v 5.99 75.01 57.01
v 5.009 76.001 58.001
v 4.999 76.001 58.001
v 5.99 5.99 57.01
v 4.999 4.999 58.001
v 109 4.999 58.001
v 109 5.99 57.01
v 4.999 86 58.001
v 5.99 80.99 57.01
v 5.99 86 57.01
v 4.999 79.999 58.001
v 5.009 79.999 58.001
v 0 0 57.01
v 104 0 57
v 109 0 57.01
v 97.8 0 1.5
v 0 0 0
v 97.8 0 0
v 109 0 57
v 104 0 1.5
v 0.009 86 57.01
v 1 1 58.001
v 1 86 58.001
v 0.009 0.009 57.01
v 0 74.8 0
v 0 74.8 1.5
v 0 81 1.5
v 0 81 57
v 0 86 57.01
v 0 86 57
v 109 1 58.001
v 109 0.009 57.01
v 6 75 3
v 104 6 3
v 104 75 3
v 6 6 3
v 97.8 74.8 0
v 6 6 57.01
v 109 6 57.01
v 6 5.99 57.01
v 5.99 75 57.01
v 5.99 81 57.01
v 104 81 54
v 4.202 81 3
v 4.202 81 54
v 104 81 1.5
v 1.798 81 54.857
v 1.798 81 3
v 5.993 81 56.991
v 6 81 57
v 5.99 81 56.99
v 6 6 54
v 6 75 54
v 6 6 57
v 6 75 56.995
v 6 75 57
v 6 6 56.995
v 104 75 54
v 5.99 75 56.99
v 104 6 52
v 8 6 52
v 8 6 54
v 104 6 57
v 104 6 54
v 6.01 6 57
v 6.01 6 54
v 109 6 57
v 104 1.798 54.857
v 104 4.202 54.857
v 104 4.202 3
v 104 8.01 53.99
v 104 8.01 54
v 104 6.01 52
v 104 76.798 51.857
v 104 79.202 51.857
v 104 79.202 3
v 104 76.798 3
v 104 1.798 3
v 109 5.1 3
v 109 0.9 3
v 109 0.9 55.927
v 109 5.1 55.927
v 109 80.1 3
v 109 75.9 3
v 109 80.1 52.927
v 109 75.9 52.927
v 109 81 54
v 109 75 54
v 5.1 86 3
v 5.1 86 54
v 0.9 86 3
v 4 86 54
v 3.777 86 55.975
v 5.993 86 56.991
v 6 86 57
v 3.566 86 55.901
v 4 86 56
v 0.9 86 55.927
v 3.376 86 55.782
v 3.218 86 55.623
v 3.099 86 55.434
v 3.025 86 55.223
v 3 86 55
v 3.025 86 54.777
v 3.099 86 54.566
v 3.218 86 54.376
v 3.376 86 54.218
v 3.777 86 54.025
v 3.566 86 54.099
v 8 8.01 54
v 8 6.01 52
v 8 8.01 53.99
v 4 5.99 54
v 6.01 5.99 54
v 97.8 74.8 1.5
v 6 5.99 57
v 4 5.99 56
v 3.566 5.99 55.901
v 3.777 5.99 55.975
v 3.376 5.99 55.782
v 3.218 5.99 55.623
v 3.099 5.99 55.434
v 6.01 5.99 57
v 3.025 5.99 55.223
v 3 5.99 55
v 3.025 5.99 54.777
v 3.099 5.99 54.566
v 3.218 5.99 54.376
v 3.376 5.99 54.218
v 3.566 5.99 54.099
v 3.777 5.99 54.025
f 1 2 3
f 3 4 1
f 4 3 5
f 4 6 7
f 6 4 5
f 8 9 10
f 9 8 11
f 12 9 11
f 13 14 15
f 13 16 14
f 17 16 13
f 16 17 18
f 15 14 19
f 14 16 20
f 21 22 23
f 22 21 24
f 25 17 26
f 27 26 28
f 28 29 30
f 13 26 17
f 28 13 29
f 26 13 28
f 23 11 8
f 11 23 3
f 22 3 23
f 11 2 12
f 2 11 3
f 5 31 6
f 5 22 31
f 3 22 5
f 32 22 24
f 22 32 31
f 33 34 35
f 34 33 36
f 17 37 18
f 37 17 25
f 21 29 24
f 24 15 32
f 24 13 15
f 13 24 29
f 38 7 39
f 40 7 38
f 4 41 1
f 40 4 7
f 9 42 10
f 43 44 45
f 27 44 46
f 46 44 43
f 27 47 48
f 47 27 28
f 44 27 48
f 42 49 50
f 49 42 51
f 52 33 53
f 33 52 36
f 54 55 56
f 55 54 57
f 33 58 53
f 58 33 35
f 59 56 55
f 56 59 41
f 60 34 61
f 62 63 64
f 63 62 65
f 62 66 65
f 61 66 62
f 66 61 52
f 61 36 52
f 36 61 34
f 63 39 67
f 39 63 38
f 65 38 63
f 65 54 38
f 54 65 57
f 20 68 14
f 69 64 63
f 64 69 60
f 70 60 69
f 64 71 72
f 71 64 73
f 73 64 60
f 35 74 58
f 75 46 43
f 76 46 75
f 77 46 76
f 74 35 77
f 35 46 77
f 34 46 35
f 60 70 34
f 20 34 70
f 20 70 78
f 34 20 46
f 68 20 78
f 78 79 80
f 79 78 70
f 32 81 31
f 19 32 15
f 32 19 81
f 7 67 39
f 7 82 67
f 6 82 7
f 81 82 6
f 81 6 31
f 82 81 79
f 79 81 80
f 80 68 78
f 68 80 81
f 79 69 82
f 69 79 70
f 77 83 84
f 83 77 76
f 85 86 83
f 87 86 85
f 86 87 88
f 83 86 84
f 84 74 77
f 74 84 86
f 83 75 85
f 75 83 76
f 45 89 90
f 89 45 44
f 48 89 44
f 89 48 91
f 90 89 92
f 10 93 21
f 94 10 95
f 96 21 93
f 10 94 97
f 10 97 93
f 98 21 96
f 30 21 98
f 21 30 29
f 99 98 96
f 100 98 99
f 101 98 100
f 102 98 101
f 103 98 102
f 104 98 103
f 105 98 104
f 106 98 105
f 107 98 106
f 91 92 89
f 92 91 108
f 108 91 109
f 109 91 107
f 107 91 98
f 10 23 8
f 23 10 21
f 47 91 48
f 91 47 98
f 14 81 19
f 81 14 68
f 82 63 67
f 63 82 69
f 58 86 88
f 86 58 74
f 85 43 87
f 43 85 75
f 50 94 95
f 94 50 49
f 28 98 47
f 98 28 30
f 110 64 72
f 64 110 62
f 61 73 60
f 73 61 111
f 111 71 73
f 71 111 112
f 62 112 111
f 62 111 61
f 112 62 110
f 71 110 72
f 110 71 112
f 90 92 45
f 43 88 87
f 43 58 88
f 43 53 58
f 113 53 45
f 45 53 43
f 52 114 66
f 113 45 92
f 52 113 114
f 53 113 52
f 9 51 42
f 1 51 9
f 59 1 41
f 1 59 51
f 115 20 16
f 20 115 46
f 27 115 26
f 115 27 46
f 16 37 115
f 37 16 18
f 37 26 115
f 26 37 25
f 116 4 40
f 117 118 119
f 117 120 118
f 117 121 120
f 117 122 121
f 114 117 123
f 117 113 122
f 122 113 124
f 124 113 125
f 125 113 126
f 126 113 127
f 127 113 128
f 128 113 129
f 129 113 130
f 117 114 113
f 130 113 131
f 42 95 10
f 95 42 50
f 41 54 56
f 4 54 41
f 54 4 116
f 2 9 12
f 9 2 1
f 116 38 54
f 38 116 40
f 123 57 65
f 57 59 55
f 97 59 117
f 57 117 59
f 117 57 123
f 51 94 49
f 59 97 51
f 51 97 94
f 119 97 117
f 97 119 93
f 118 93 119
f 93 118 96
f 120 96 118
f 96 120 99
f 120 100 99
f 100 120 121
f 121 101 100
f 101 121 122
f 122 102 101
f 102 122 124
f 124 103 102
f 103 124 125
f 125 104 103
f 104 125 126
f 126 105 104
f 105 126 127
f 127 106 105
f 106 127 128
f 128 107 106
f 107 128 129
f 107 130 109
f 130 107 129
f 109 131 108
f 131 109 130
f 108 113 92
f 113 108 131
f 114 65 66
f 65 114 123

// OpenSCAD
// ============================================================================
// ★★★ STABLE BASELINE — v23_stable (2026-06-23) ★★★
// First fully stable lid design: recessed clear-sheet lid, capped journal hinge,
// two light detent clips flanking an elliptical finger notch, support rail cut
// away across the notch span. Geometry verified balanced; print-ready.
// DO NOT overwrite — branch from this for the post-first-print iteration.
// ============================================================================
// cutlery_box.scad
// Graduated 3-chamber disposable-cutlery box (Option 3) — CUT-FROM-SOLID port
// of build_box.py, for a 120 x 120 x 120 mm printer (AOSEED).
//
// WHY THIS PORT EXISTS (the whole point):
//   The hand-mesh generator (build_box.py) could not keep the 1 mm rim chamfer
//   continuous across the female dovetail joints, because where a slot's flared
//   corner crosses the sloped chamfer it needs a true boolean intersection.
//   OpenSCAD HAS that boolean kernel, so here we do exactly the "cut-from-solid"
//   thing:
//      1. Build the ENTIRE box as ONE solid, WITH the chamfer already on it.
//      2. difference() out vertical dovetail prisms ( /_\ cross-section ),
//         running from just above the base plate up THROUGH the rim, to both
//         (a) form the sliding-dovetail joints, and
//         (b) split the box into 6 bed-sized pieces.
//   Because the cut is a real boolean through the already-chamfered solid, the
//   sloped chamfer<->slot edge is produced for free => the rim chamfer stays
//   CONTINUOUS across every joint, with none of the sliver hacks.
//
// ----------------------------------------------------------------------------
// HOW TO USE
//   In the app:  set `part` below (or use the Customizer dropdown), F5 to
//                preview, F6 to render, then File > Export > STL.
//   One piece (CLI):
//      openscad -o body_knife_A.stl -D 'part="knife_A"' cutlery_box.scad
//   ALL SIX (bash, run from this folder):
//      for p in knife_A knife_B fork_A fork_B spoon_A spoon_B; do \
//        openscad -o "body_$p.stl" -D "part=\"$p\"" cutlery_box.scad ; done
//   PNG preview of one piece:
//      openscad -o knife_B.png --imgsize=1400,1000 --autocenter --viewall \
//        -D 'part="knife_B"' cutlery_box.scad
//
//   Pieces are modelled in ASSEMBLED coordinates (floor-down, z=0 is the bed),
//   so importing all six STLs together shows the assembled box directly; your
//   slicer will auto-drop each one onto the plate for printing.
//
// BED SANITY: every piece is <= 120 mm in X, Y, Z.
//   Z = 58 mm. Widest piece = spoon at 117 mm (Y). A-halves reach 109 mm (X,
//   including the protruding dovetail key). All under 120.
//
// !! I could NOT run OpenSCAD to verify this file (no binary in my sandbox) !!
//   - The rim chamfer is a SMOOTH, true-45 bevel built from hull() frustums of
//     convex rectangles. Works in every OpenSCAD since ~2015 (incl. Homebrew
//     2021.01). No stepped staircase -- and, crucially, it makes box() a clean
//     well-formed solid so the per-part booleans resolve reliably (the old
//     14-slice staircase was fragile and CGAL was dropping the walls of the
//     interior parts, leaving only the key prisms => "floating boxes").
//   - roof() is still available behind USE_ROOF=true for those who have it
//     (2021.01+ snapshots); for THIS rectangular design it is identical, so it
//     is NOT required.
//   - After F6, check the console for "WARNING"/"not a valid 2-manifold".
//     If a tenon ever looks detached, bump EPS to 0.05.
// ============================================================================


/* [Part to render / export] */
part = "knife_A"; // [knife_A, knife_B, fork_A, fork_B, spoon_A, spoon_B, assembly]

/* [Chamfer method] */
// false = smooth hull() frustum bevel (default, any OpenSCAD); true = roof() (2021.01+)
USE_ROOF = false;

/* [Heights (mm)] */
BASE   = 3.0;     // floor / base-plate thickness
COMP_H = 55.0;    // interior wall height above the floor (cutlery stack depth)

/* [Walls (mm)] */
HOST_T   = 6.0;     // thickness of every wall (thick enough to host a dovetail)
HALF_LEN = 104.0;   // printed length of each half (A = near, B = far); <120 incl. key

/* [Chamber bays (mm)] */
N_COL     = 3;       // columns of cutlery per chamber
KNIFE_COL = 23.0;    // -> knife bay 69  (3 x 19 mm knives + play)
FORK_COL  = 33.0;    // -> fork  bay 99  (3 x 29 mm forks  + play)
SPOON_COL = 37.0;    // -> spoon bay 111 (3 x 34 mm spoons + play, trimmed <120)

/* [Dovetail joint (mm)] */
DT_DEPTH = 5.0;   // tail protrusion past the seam (male key depth)
DT_NECK  = 1.2;   // half-width at the seam face (narrow)
DT_FLARE = 2.1;   // half-width at the tip (wide -> locks)
DT_CLR   = 0.4;   // FLANK/seam slide clearance added to the female socket (do not change for fit)
DT_DEPTH_RELIEF = 0.3; // extra depth on the socket BACK only, so the tail tip never bottoms out

/* [Hidden-dovetail top cap / "hat" (mm)] */
// The dovetail otherwise shows its trapezoid outline on the TOP edge of the wall.
// To hide it, the MALE piece extends the wall's full-width top (chamfer included)
// across the key footprint -> a flush, continuous top. The FEMALE piece gets a
// matching top RECESS (cap footprint + CAP_CLR) so the cap drops straight in.
// Result: the top reads as one surface with a single straight seam line at the cap
// tip; the dovetail joinery lives entirely below the cap.
//
// SELF-SUPPORTING UNDERSIDE: the cap reaches the FULL wall width at the chamfer base
// (so the top edge reads as the wall extended, with NO recessed sliver on the outer
// face), and its underside is ONE planar ramp from the chamfer's OUTER CORNER
// (half-width HOST_T/2 at z = BODY_H-CHAMFER) down to the dovetail-neck half-width
// (CAP_FOOT) at CAP_SLANT_DEG from horizontal. No little horizontal step. The ramp
// reaching full width exactly at the chamfer base means "ramp top" == "chamfer base"
// (CAP_H is DERIVED). The FEMALE recess is the same ramp + CAP_CLR play.
// TRADEOFF: because the cap runs all the way to the outer corner, the female wall
// tapers to ~0 at z = BODY_H-CHAMFER -> a thin feather edge at the joint (gradual at
// CAP_SLANT_DEG, hidden inside the joint when assembled). Accepted per design intent.
CAP_SLANT_DEG = 50;     // cap underside ramp angle from horizontal (50 = self-supporting, long flare)
CAP_FOOT = DT_NECK;     // cap-underside half-width where it meets the dovetail neck
CAP_CLR = 0.3;          // slide clearance so the male cap seats into the female top recess

/* [Rim chamfer (mm)] */
CHAMFER = 1.0;    // 45-deg comfort break broken along the top wall edges

/* [Base half-lap / anti-warp (mm)] */
// Neighbouring base plates overlap as a HORIZONTAL half-lap (shiplap) at mid-base
// height, so corners stay coplanar (no lift/protrusion). Horizontal lap faces do
// NOT bind the vertical-drop assembly. Shingle direction: A->B and knife->fork->spoon.
LAP_LEN = 6;        // overlap past the A/B seam and the knife/fork seam
LAP_LEN_FS = 2;     // overlap past the fork/SPOON seam -- SMALLER: spoon is the
                    // tightest piece (117mm of the 120mm bed); a 6mm lap there
                    // would push spoon to 123mm. 2mm keeps spoon at 119mm.
LAP_Z   = BASE/2;   // 1.5 -- horizontal split height of the lap (bottom vs top half)
LAP_CLR = 0.2;      // in-plane clearance so the shelf isn't a press fit

/* [Lid — box features that receive a flat ORDERED clear sheet] */
// The lid itself is NOT printed: it's a flat ~2 mm PETG/Tritan sheet, bullnose-polished
// edges (r=LID_EDGE_R), ordered to size. We only model the box features that receive it.
LID_T            = 2.0;   // ordered sheet thickness
LID_EDGE_R       = 1.0;   // ordered sheet bullnose edge radius (for the sheet order spec)
LID_PLAY         = 0.4;   // total vertical play in the hinge groove (sheet + this)
LID_RECESS       = 2.0;   // lid TOP sits this far BELOW the rim, so the journal pocket is fully
                          // capped (rim caps the bullnose -> retains the lid when raised; tilt-in)
HINGE_AT_MINUS_X = true;  // hinge on the -x (303mm) end wall; clip on +x. (flip = mirror; default delivered)
// perimeter support ledge (lid underside rests on it at z = BODY_H-LID_T)
LEDGE_W          = 2.0;   // ledge inward protrusion (its underside ramps back at 45 deg -> self-supporting)
GROOVE_END_INSET = 0.0;   // groove reaches the corners but RUNS OUT smoothly there (no end-face / no
                          // exposed bore); GROOVE_TAPER sets the run-out length
GROOVE_TAPER     = 4.0;   // y-length over which the eased mouth tapers out at each groove end
// hinge journal (cut into the inner face of the hinge end wall, CONTINUOUS along the long edge)
GROOVE_DEPTH     = 3.0;   // 2mm lead-in slot + 1mm pocket radius -> journal sits 2mm back from the
                          // face so its cap clears the swing relief and RETAINS the lid
GROOVE_POCKET_R  = 1.0;   // journal half-cylinder radius (the bullnose sheet edge rolls in it)
// clip latch — TWO light DETENT clips on the clip end wall, flanking a central finger notch.
// "Light detent" = small overhang so the rigid sheet pops past it by hand (not a firm lock).
CLIP_W           = 8.0;   // width of EACH of the two clips
CLIP_LIP         = 0.3;   // retaining overhang (light detent; 0.3 soft .. 0.6 firm-but-stiff)
CLIP_RAMP_H      = 1.6;   // cam-ramp height (press-to-close lead-in)
// finger notch — a through-cut in the clip wall (visible from outside), centered between the
// two clips, so a fingertip can reach the lid edge and lift it (popping both clips at once).
NOTCH_W          = 20.0;  // finger-notch width
NOTCH_DEPTH      = 6.0;   // how far down from the rim to the deepest point (past the lid edge)
NOTCH_ARCH       = 4.0;   // bottom is an ELLIPTICAL arch this tall; the rest is vertical sides
                          // (NOTCH_ARCH < NOTCH_W/2 -> a gentle arch, not a deep half-circle)


/* [Hidden] */
EPS      = 0.01;          // tiny overlap so abutting solids fuse cleanly in CGAL
// Upper-chamber pieces (fork, spoon) were cut by a cell plane laid EXACTLY on the
// divider wall's far face (the lower chamber owns that wall). intersection() along a
// plane coincident with an existing box face makes CGAL leave a ZERO-THICKNESS copy
// of the wall face -> edge-manifold + "watertight" but degenerate (OpenSCAD shows it
// as a blue back-face; Tinkercad thickens it into a phantom block). SEAM_EPS nudges
// those cut planes a hair INTO the open bay so they no longer coincide with any box
// face -> no flap. 0.02 mm is physically nothing but is well clear of CGAL's tolerance.
SEAM_EPS = 0.02;
CUT_OVER = 1.0;           // how far dovetail cutters overshoot the rim (clean cut)

BODY_H    = BASE + COMP_H;     // 58  total height
END_WALL  = HOST_T;            // end walls are dovetail hosts too -> equally thick
TOTAL_LEN = 2 * HALF_LEN;      // 208 assembled length (end wall .. end wall)

// hidden-cap ramp geometry (derived).
//   CAP_HW    = cap MAX half-width = HOST_T/2 (the full wall edge) at the chamfer base.
//   CAP_RISE  = vertical height of the self-supporting CAP_SLANT_DEG underside ramp.
//   CAP_ZRAMP = where the cap reaches full width = the chamfer base (BODY_H-CHAMFER), so
//               the ramp runs straight to the chamfer OUTER CORNER (no horizontal step).
//   CAP_ZBOT  = cap bottom = ramp start; CAP_H derived from it (for reference/report).
//   CAP_ZRAMP_R = recess ramp top, shifted down by CAP_CLR so the recess ramp stays
//               parallel to the cap ramp with uniform play.
CAP_HW      = HOST_T/2;   // cap reaches the FULL wall edge at the chamfer base
CAP_RISE    = (CAP_HW - CAP_FOOT) * tan(CAP_SLANT_DEG);
CAP_ZRAMP   = BODY_H - CHAMFER;               // full width exactly at the chamfer base / outer corner
CAP_ZBOT    = CAP_ZRAMP - CAP_RISE;
CAP_H       = BODY_H - CAP_ZBOT;              // derived; reported
CAP_ZRAMP_R = CAP_ZRAMP;   // recess ramp ALSO tops at the chamfer corner (mirror the cap) -> no vertical lip
// sanity checks
assert(CAP_ZBOT > BASE + 1,
       "cap zone dips too low -- raise CAP_SLANT_DEG");
assert(CAP_HW >= DT_FLARE,
       "cap too narrow to cover the dovetail tail");

// NOTE: lid-derived constants are defined BELOW the Y-layout block, because some of
// them (INTERIOR_Y0/Y1, CLIP_CY) depend on OUTER_L / OUTER_R / EXT_W. See "lid derived".

// bay widths
KNIFE_BAY = N_COL * KNIFE_COL; // 69
FORK_BAY  = N_COL * FORK_COL;  // 99
SPOON_BAY = N_COL * SPOON_COL; // 111

// ---- Y layout (width direction): wall | bay | divider | bay | divider | bay | wall
KNIFE_Y0 = 0;
KNIFE_Y1 = HOST_T + KNIFE_BAY + HOST_T;        // 0..81   (outer wall + bay + divider)
FORK_Y0  = KNIFE_Y1;                           // 81
FORK_Y1  = FORK_Y0 + FORK_BAY + HOST_T;        // 81..186 (bay + divider)
SPOON_Y0 = FORK_Y1;                            // 186
SPOON_Y1 = SPOON_Y0 + SPOON_BAY + HOST_T;      // 186..303(bay + outer wall)
EXT_W    = SPOON_Y1;                           // 303 total width

// lengthwise wall Y-bands [y0,y1] (host the A/B dovetails) + their centers
OUTER_L  = [0, HOST_T];                                       // [0,6]    c=3
DIV_KF   = [HOST_T + KNIFE_BAY, HOST_T + KNIFE_BAY + HOST_T]; // [75,81]  c=78
DIV_FS   = [FORK_Y0 + FORK_BAY, FORK_Y0 + FORK_BAY + HOST_T]; // [180,186]c=183
OUTER_R  = [SPOON_Y1 - HOST_T, SPOON_Y1];                     // [297,303]c=300

// ---- lid derived ---- (placed AFTER OUTER_L/OUTER_R/EXT_W so nothing is forward-referenced)
LID_TOP_Z   = BODY_H - LID_RECESS;        // 56  lid TOP (recessed); rim z=58 rises LID_RECESS above it
LID_Z_UNDER = LID_TOP_Z - LID_T;          // 54  lid underside / ledge top / lowered-divider top
POCKET_CZ   = LID_TOP_Z - LID_T/2;        // 55  journal centre (lid mid) -> pocket top = LID_TOP_Z = capped
// hinge end-wall inner face x + inward direction; clip end-wall inner face x + inward dir
HINGE_INX   = HINGE_AT_MINUS_X ? END_WALL : TOTAL_LEN - END_WALL;       // 6  (default)
HINGE_IN    = HINGE_AT_MINUS_X ? 1 : -1;  // interior direction from the hinge wall (+x default)
CLIP_INX    = HINGE_AT_MINUS_X ? TOTAL_LEN - END_WALL : END_WALL;       // 202 (default)
CLIP_IN     = HINGE_AT_MINUS_X ? -1 : 1;  // interior direction from the clip wall (-x default)
POCKET_CX   = HINGE_INX - HINGE_IN*(GROOVE_DEPTH - GROOVE_POCKET_R);    // 5  pocket centre x (INTO the wall)
INTERIOR_Y0 = OUTER_L[1];                 // 6   inner face of the -y short wall
INTERIOR_Y1 = OUTER_R[0];                 // 297 inner face of the +y short wall
CLIP_CY     = EXT_W/2;                     // 151.5 clip/scallop centre (in the fork chamber)
assert(POCKET_CZ - GROOVE_POCKET_R > BASE + 1,
       "journal dips too low -- reduce LID_RECESS or LID_T");
assert(POCKET_CZ + GROOVE_POCKET_R <= LID_TOP_Z + EPS,
       "journal not capped -- lower the lid (raise LID_RECESS) or shrink GROOVE_POCKET_R");
// NOTE: with LID_RECESS the lid underside (and lowered dividers) sit BELOW CAP_ZBOT. That is
// intended: the inner dividers are cut flat below the cap zone (their hidden caps are removed,
// but the lid covers them); the perimeter/end-wall caps are untouched (full-height walls).

// the three OPEN bays are rectangular holes in the wall footprint:
//   footprint = outer rectangle MINUS these bays  (== the 6 walls; verified).
// The smooth chamfer is built from exactly this decomposition.
BAY_X0 = END_WALL;              // 6
BAY_X1 = TOTAL_LEN - END_WALL;  // 202
BAYS = [
    [BAY_X0, BAY_X1, HOST_T,   HOST_T + KNIFE_BAY],   // knife bay [6,202] x [6,75]
    [BAY_X0, BAY_X1, FORK_Y0,  FORK_Y0 + FORK_BAY],   // fork  bay [6,202] x [81,180]
    [BAY_X0, BAY_X1, SPOON_Y0, SPOON_Y0 + SPOON_BAY], // spoon bay [6,202] x [186,297]
];

YC_OUTL  = OUTER_L[0] + HOST_T/2;   // 3   outer-left wall center
YC_DIVKF = DIV_KF[0]  + HOST_T/2;   // 78  knife/fork divider center
YC_DIVFS = DIV_FS[0]  + HOST_T/2;   // 183 fork/spoon divider center
YC_OUTR  = OUTER_R[0] + HOST_T/2;   // 300 outer-right wall center

// seams
AB_SEAM = HALF_LEN;               // 104  A/B length seam (x)
SEAM_KF = FORK_Y0;                // 81   knife/fork width seam (y)
SEAM_FS = SPOON_Y0;              // 186  fork/spoon width seam (y)
ENDC_A  = END_WALL/2;             // 3    A end-wall center (x) -> chamber dovetails
ENDC_B  = TOTAL_LEN - END_WALL/2; // 205  B end-wall center (x)


// ============================================================================
// 2D wall footprint (cross-section of all walls, constant in z for the straight
// part). Union of: 2 full-width end walls + 4 lengthwise walls between them.
// ============================================================================
module wall_footprint_2d() {
    // footprint = outer rectangle minus the 3 open bays  (== the 6 walls)
    difference() {
        square([TOTAL_LEN, EXT_W]);
        for (b = BAYS) translate([b[0], b[2]]) square([b[1] - b[0], b[3] - b[2]]);
    }
}

// ============================================================================
// The full chamfered box solid = base plate + walls with a continuous 1 mm
// top-rim chamfer. Built ONCE; every piece is carved out of this.
// ============================================================================
module chamfer_cap() {
    // SMOOTH 45 rim chamfer over z[BODY_H-CHAMFER, BODY_H], in absolute coords.
    zm = BODY_H - CHAMFER;
    if (USE_ROOF) {
        // exact straight-skeleton roof, capped at CHAMFER height (needs roof()).
        intersection() {
            translate([0,0,zm]) roof() wall_footprint_2d();
            translate([0,0,zm]) linear_extrude(CHAMFER + EPS) wall_footprint_2d();
        }
    } else {
        // DEFAULT: true 45 bevel as hull() frustums of CONVEX rectangles -> smooth
        // AND a clean manifold.  Since footprint = outer - bays, the chamfer of the
        // footprint = (outer rectangle beveled inward) MINUS (each bay beveled so it
        // grows toward the top, which bevels every bay-facing rim).  All hull()s are
        // on convex rectangles, so nothing gets convex-filled.
        difference() {
            // outer perimeter frustum: full outer rect at zm -> inset by CHAMFER at top
            hull() {
                translate([0,0,zm])     linear_extrude(0.001) square([TOTAL_LEN, EXT_W]);
                translate([0,0,BODY_H]) linear_extrude(0.001) offset(delta=-CHAMFER) square([TOTAL_LEN, EXT_W]);
            }
            // each bay grows by CHAMFER toward the top -> bevels its surrounding rim.
            // (overshoots z a hair past both ends so the cut is clean.)
            for (b = BAYS)
                hull() {
                    translate([0,0,zm-EPS])     linear_extrude(0.001)
                        translate([b[0],b[2]]) offset(delta=-EPS)        square([b[1]-b[0], b[3]-b[2]]);
                    translate([0,0,BODY_H+EPS]) linear_extrude(0.001)
                        translate([b[0],b[2]]) offset(delta=CHAMFER+EPS) square([b[1]-b[0], b[3]-b[2]]);
                }
        }
    }
}

module box() {
    zm = BODY_H - CHAMFER;
    union() {
        cube([TOTAL_LEN, EXT_W, BASE]);                                        // base plate z[0,3]
        translate([0,0,BASE]) linear_extrude(zm - BASE + EPS) wall_footprint_2d(); // straight walls z[3,57]
        chamfer_cap();                                                         // smooth chamfer z[57,58]
    }
}

// ============================================================================
// Dovetail prisms ( /_\ ). Vertical, z[BASE, BODY_H+CUT_OVER] so they cut
// through the rim but leave the base plate continuous. The near face is pushed
// back EPS so a male key always fuses to its wall.
//   male key   : half_n=DT_NECK,         half_f=DT_FLARE
//   female slot: half_n=DT_NECK+DT_CLR,  half_f=DT_FLARE+DT_CLR
// ============================================================================
module dt_prism_X(seam_x, yc, half_n, half_f) {   // perpendicular to X, grows +X
    translate([0,0,BASE]) linear_extrude(BODY_H - BASE + CUT_OVER)
        polygon([[seam_x - EPS,        yc - half_n],
                 [seam_x + DT_DEPTH,   yc - half_f],
                 [seam_x + DT_DEPTH,   yc + half_f],
                 [seam_x - EPS,        yc + half_n]]);
}
module dt_prism_Y(seam_y, xc, half_n, half_f) {   // perpendicular to Y, grows +Y
    translate([0,0,BASE]) linear_extrude(BODY_H - BASE + CUT_OVER)
        polygon([[xc - half_n, seam_y - EPS],
                 [xc - half_f, seam_y + DT_DEPTH],
                 [xc + half_f, seam_y + DT_DEPTH],
                 [xc + half_n, seam_y - EPS]]);
}
module ab_key   (yc)        { dt_prism_X(AB_SEAM, yc, DT_NECK, DT_FLARE); }
module ch_key   (seam_y, xc){ dt_prism_Y(seam_y, xc, DT_NECK, DT_FLARE); }

// Female sockets = male + DT_CLR on the flanks/seam (unchanged), PLUS a straight
// back-face relief of DT_DEPTH_RELIEF so the tail tip never bottoms out. The
// relief is a rectangle tacked onto the trapezoid's tip at the SAME flare width,
// so the angled flank faces (and their 0.4 mm slide clearance) are untouched.
module ab_socket(yc) {
    dt_prism_X(AB_SEAM, yc, DT_NECK + DT_CLR, DT_FLARE + DT_CLR);
    translate([0,0,BASE]) linear_extrude(BODY_H - BASE + CUT_OVER)
        translate([AB_SEAM + DT_DEPTH, yc - (DT_FLARE + DT_CLR)])
            square([DT_DEPTH_RELIEF, 2*(DT_FLARE + DT_CLR)]);          // back relief, +X
}
module ch_socket(seam_y, xc) {
    dt_prism_Y(seam_y, xc, DT_NECK + DT_CLR, DT_FLARE + DT_CLR);
    translate([0,0,BASE]) linear_extrude(BODY_H - BASE + CUT_OVER)
        translate([xc - (DT_FLARE + DT_CLR), seam_y + DT_DEPTH])
            square([2*(DT_FLARE + DT_CLR), DT_DEPTH_RELIEF]);          // back relief, +Y
}

// ===== hidden-dovetail top cap ("hat"), SELF-SUPPORTING underside ===============
// MALE cap: a FULL-wall-width hat whose underside is ONE planar ramp from the chamfer's
// OUTER CORNER (half-width CAP_HW = HOST_T/2 at CAP_ZRAMP = BODY_H-CHAMFER) down to the
// dovetail-neck half-width (CAP_FOOT) at CAP_SLANT_DEG from horizontal -> the self-
// supporting shoulder, running straight to the corner (no horizontal step). Built as
// hull(narrow bottom slab buried in the tail neck, full-width top slab through the rim);
// box() trims it to the wall and adds the continuous rim chamfer for free, so the outer
// top edge reads as the wall extended (no recessed sliver). The protruding NOSE is left
// SQUARE (vertical) -- hidden in the female socket when assembled.
// TRADEOFF: the female wall tapers to ~0 at z=BODY_H-CHAMFER (a thin feather edge at the
// joint, gradual at CAP_SLANT_DEG) -- accepted per design intent.
module ab_cap(yc) {   // A/B seam, grows +X past the seam (length direction)
    hull() {
        translate([AB_SEAM - EPS, yc - CAP_FOOT, CAP_ZBOT])
            cube([DT_DEPTH + EPS, 2*CAP_FOOT, EPS]);
        translate([AB_SEAM - EPS, yc - CAP_HW,   CAP_ZRAMP])
            cube([DT_DEPTH + EPS, 2*CAP_HW, (BODY_H + CUT_OVER) - CAP_ZRAMP]);
    }
}
module ch_cap(seam_y, xc) {   // chamber seam, grows +Y past the seam (in the end wall)
    hull() {
        translate([xc - CAP_FOOT, seam_y - EPS, CAP_ZBOT])
            cube([2*CAP_FOOT, DT_DEPTH + EPS, EPS]);
        translate([xc - CAP_HW,   seam_y - EPS, CAP_ZRAMP])
            cube([2*CAP_HW, DT_DEPTH + EPS, (BODY_H + CUT_OVER) - CAP_ZRAMP]);
    }
}
// FEMALE recess: the SAME ramp grown by CAP_CLR (flanks, tip, floor, and ramp shifted down
// by CAP_CLR so it stays parallel) -> the cap seats with uniform slide clearance. It opens
// to the wall edge (and a hair past, into air) so the cap's full-width corner drops in;
// this is what leaves the thin female feather at the top (accepted). Open upward + toward seam.
module ab_cap_neg(yc) {
    hull() {
        translate([AB_SEAM - EPS, yc - (CAP_FOOT + CAP_CLR), CAP_ZBOT - CAP_CLR])
            cube([DT_DEPTH + CAP_CLR + EPS, 2*(CAP_FOOT + CAP_CLR), EPS]);
        translate([AB_SEAM - EPS, yc - (CAP_HW + EPS), CAP_ZRAMP_R])
            cube([DT_DEPTH + CAP_CLR + EPS, 2*(CAP_HW + EPS), (BODY_H + CUT_OVER + 1) - CAP_ZRAMP_R]);
    }
}
module ch_cap_neg(seam_y, xc) {
    hull() {
        translate([xc - (CAP_FOOT + CAP_CLR), seam_y - EPS, CAP_ZBOT - CAP_CLR])
            cube([2*(CAP_FOOT + CAP_CLR), DT_DEPTH + CAP_CLR + EPS, EPS]);
        translate([xc - (CAP_HW + EPS), seam_y - EPS, CAP_ZRAMP_R])
            cube([2*(CAP_HW + EPS), DT_DEPTH + CAP_CLR + EPS, (BODY_H + CUT_OVER + 1) - CAP_ZRAMP_R]);
    }
}
// LOWERED-DIVIDER hat: same 50-deg self-supporting cap as ab_cap, but reaching FULL width at the
// LOWERED divider top (LID_Z_UNDER) instead of the rim -- because the inner dividers are lowered
// for the lid, which strips their normal cap. It extends above the top and is trimmed flush to
// LID_Z_UNDER by divider_lower(), so the divider top reads as one surface (dovetail hidden below).
DCAP_ZRAMP = LID_Z_UNDER;            // full width at the lowered divider top (54)
DCAP_ZBOT  = DCAP_ZRAMP - CAP_RISE;  // ramp start (neck), 50 deg below
module div_cap(yc) {        // male hat on the lowered divider (A/B seam)
    hull() {
        translate([AB_SEAM - EPS, yc - CAP_FOOT, DCAP_ZBOT])
            cube([DT_DEPTH + EPS, 2*CAP_FOOT, EPS]);
        translate([AB_SEAM - EPS, yc - CAP_HW,   DCAP_ZRAMP])
            cube([DT_DEPTH + EPS, 2*CAP_HW, (BODY_H + CUT_OVER) - DCAP_ZRAMP]);
    }
}
module div_cap_neg(yc) {    // female recess to receive div_cap (with CAP_CLR slide play)
    hull() {
        translate([AB_SEAM - EPS, yc - (CAP_FOOT + CAP_CLR), DCAP_ZBOT - CAP_CLR])
            cube([DT_DEPTH + CAP_CLR + EPS, 2*(CAP_FOOT + CAP_CLR), EPS]);
        translate([AB_SEAM - EPS, yc - (CAP_HW + EPS), DCAP_ZRAMP])
            cube([DT_DEPTH + CAP_CLR + EPS, 2*(CAP_HW + EPS), (BODY_H + CUT_OVER + 1) - DCAP_ZRAMP]);
    }
}

// rectangular cell (x[xa,xb], y[ya,yb], full height + margin) used to split pieces
module cell(xa, xb, ya, yb) {
    translate([xa, ya, -1]) cube([xb - xa, yb - ya, BODY_H + 11]);
}

// ===== base half-lap (shiplap) =================================================
// HORIZONTAL lap at mid-base height: the shelf-owner keeps its BOTTOM half
// (z 0..LAP_Z) extending LAP_LEN past the seam; the neighbour has its bottom half
// REMOVED there (keeps only the top half) and lands flat on the shelf. Horizontal
// faces => no binding during the vertical drop. Shelves live entirely in the base
// (z < BASE), well clear of the wall dovetails (z >= BASE).
// Shingle = FEMALE-first (matches the no-notch dovetail assembly order, which
// lowers the male piece onto the female): the B half owns the A/B shelf (grows
// -X into A) and the UPPER chamber (fork, spoon) owns the chamber shelf (grows
// -Y into the lower chamber).  Order: spoon, fork, knife; B before A.
module lap_shelf_X(y0, y1) {                 // B-side shelf, grows -X into A past AB_SEAM
    // +EPS past AB_SEAM so the shelf interpenetrates (not just abuts) its own B body -> fuses cleanly.
    translate([AB_SEAM - LAP_LEN, y0, 0]) cube([LAP_LEN + EPS, y1 - y0, LAP_Z]);
}
module lap_neg_X(y0, y1) {                   // A-side: remove bottom half to receive it
    translate([AB_SEAM - LAP_LEN - LAP_CLR, y0 - EPS, -EPS])
        cube([LAP_LEN + LAP_CLR + EPS, (y1 - y0) + 2*EPS, LAP_Z + EPS]);
}
module lap_shelf_Y(seam_y, x0, x1, ln=LAP_LEN) {   // upper-chamber shelf, grows -Y into lower
    // grows -Y by `ln` into the lower chamber AND +Y by 2*SEAM_EPS past the seam so it
    // always overlaps the (SEAM_EPS-nudged) body floor and stays fused -> no floating shelf.
    translate([x0, seam_y - ln, 0]) cube([x1 - x0, ln + 2*SEAM_EPS, LAP_Z]);
}
module lap_neg_Y(seam_y, x0, x1, ln=LAP_LEN) {     // lower-chamber: remove bottom half
    translate([x0 - EPS, seam_y - ln - LAP_CLR, -EPS])
        cube([(x1 - x0) + 2*EPS, ln + LAP_CLR + EPS, LAP_Z + EPS]);
}

// ============================================================================
// LID FEATURES (receive a flat ORDERED clear sheet; the sheet is not printed).
// All features live at the TOP (z >= ~52), ABOVE the dovetail engagement, the half-lap
// (z<1.5) and most of the hat, so the vertical-drop assembly and joints are untouched.
// EPS overlaps throughout; no coincident coplanar faces with the existing walls.
// Default orientation: HINGE on the -x end wall (A pieces), CLIP on the +x end wall
// (B pieces), clip+scallop centred on the fork (middle) chamber.
// ============================================================================

// --- perimeter support ledge: 45-deg self-supporting brackets; rest face at LID_Z_UNDER.
//     Runs along the CLIP end wall + the two short outer walls. (Hinge wall uses the groove.)
//     Built as hull(thin top edge, wall column) -> a triangular bracket whose underside is
//     a 45-deg ramp (prints floor-down with no support). ADDED to each piece (clipped by cell).
//     Each run is INSET by LEDGE_W from the perpendicular walls so the three brackets never
//     overlap at a corner and the wall's normal chamfer wraps every corner uninterrupted.
module lid_ledge() {
    cy0 = INTERIOR_Y0 + LEDGE_W;  cy1 = INTERIOR_Y1 - LEDGE_W;  cyl = cy1 - cy0;   // clip-run y span (inset)
    sx0 = END_WALL    + LEDGE_W;  sxl = (TOTAL_LEN - 2*END_WALL) - 2*LEDGE_W;       // short-run x span (inset)
    // clip end wall (x = CLIP_INX), bracket protrudes toward interior (CLIP_IN)
    hull() {
        translate([CLIP_INX + CLIP_IN*LEDGE_W, cy0, LID_Z_UNDER - EPS]) cube([EPS, cyl, EPS]);
        translate([CLIP_INX - EPS,             cy0, LID_Z_UNDER - LEDGE_W]) cube([2*EPS, cyl, LEDGE_W]);
    }
    // OUTER_L short wall (y = INTERIOR_Y0), bracket protrudes +y
    hull() {
        translate([sx0, INTERIOR_Y0 + LEDGE_W, LID_Z_UNDER - EPS]) cube([sxl, EPS, EPS]);
        translate([sx0, INTERIOR_Y0 - EPS,     LID_Z_UNDER - LEDGE_W]) cube([sxl, 2*EPS, LEDGE_W]);
    }
    // OUTER_R short wall (y = INTERIOR_Y1), bracket protrudes -y
    hull() {
        translate([sx0, INTERIOR_Y1 - LEDGE_W, LID_Z_UNDER - EPS]) cube([sxl, EPS, EPS]);
        translate([sx0, INTERIOR_Y1 - EPS,     LID_Z_UNDER - LEDGE_W]) cube([sxl, 2*EPS, LEDGE_W]);
    }
}

// --- hinge groove: ONE 2D cross-section (journal bore + lead-in slot + 45-deg swing ramp),
//     CAPPED at the recessed lid top (LID_TOP_Z), swept along the wall. At BOTH ends the whole
//     profile RUNS OUT smoothly -- it tapers to the inner-top rim corner (HINGE_INX, BODY_H) --
//     so there is NO end-face and NO exposed bore at the corners; the groove just fades into the
//     wall. The rim caps the bullnose (retains the lid, tilt-in); the 45-deg ramp is self-
//     supporting and gives the swing clearance; the cap stays full over the bullnose => retains.
module groove_profile() {                            // 2D cross-section in (x, z)
    union() {
        translate([POCKET_CX, POCKET_CZ]) circle(r = GROOVE_POCKET_R, $fn = 28);              // journal bore
        translate([POCKET_CX, LID_Z_UNDER]) square([HINGE_INX - POCKET_CX + EPS, LID_T]);     // lead-in slot
        polygon([[POCKET_CX, LID_TOP_Z], [HINGE_INX + EPS, LID_TOP_Z], [HINGE_INX + EPS, BODY_H - CHAMFER]]); // swing relief (below the rim chamfer)
        polygon([[HINGE_INX, BODY_H - CHAMFER], [HINGE_INX + EPS, BODY_H + EPS], [HINGE_INX - CHAMFER, BODY_H + EPS]]); // rim chamfer cut, CONTINUOUS through the divider junctions (no bulge)
    }
}
module groove_extrude(y0, y1) {                      // sweep the profile along the wall, y0..y1
    translate([0, y0, 0]) rotate([90,0,0]) translate([0,0,-(y1 - y0)]) linear_extrude(y1 - y0) groove_profile();
}
module hinge_groove() {
    // journal runs STRAIGHT to the end of the wall at each side; the perpendicular short wall
    // caps the bore there (no run-out). The EPS overlap tucks the bore end into the short wall.
    groove_extrude(INTERIOR_Y0 - EPS, INTERIOR_Y1 + EPS);
}

// --- lower the inner chamber dividers to the lid underside (mid-support, no sag).
//     Removes the divider top over the full length; outer walls keep full height.
module divider_lower() {
    // x-span is the CHAMBER BAY only [BAY_X0, BAY_X1] (+EPS overlap into the end walls so the
    // cut is manifold). The end/outer walls keep their full BODY_H tops; only the two INNER
    // dividers (DIV_KF, DIV_FS) are lowered.
    translate([BAY_X0 - EPS, DIV_KF[0], LID_Z_UNDER]) cube([BAY_X1 - BAY_X0 + 2*EPS, HOST_T, BODY_H - LID_Z_UNDER + CUT_OVER]);
    translate([BAY_X0 - EPS, DIV_FS[0], LID_Z_UNDER]) cube([BAY_X1 - BAY_X0 + 2*EPS, HOST_T, BODY_H - LID_Z_UNDER + CUT_OVER]);
}

// --- retaining clips (ADDED): TWO light detent lips on the clip end wall, flanking the finger
//     notch. Each lip overhangs the RECESSED lid top (LID_TOP_Z) by CLIP_LIP and gives a soft
//     hold; a lead-in ramp above it cams the lid under on close. Anchored into the wall. Light
//     enough that lifting the lid edge (through the notch) flexes the sheet past both at once.
CLIP_OFF = NOTCH_W/2 + CLIP_W/2;     // clip centre offset from CLIP_CY (clips sit just outside the notch)
module one_clip(yc) {
    translate([0, yc - CLIP_W/2, 0]) rotate([90,0,0]) translate([0,0,-CLIP_W]) linear_extrude(CLIP_W)
        polygon([[CLIP_INX - CLIP_IN*HOST_T/2, LID_TOP_Z - 0.8],         // anchor low, into the wall (fuse)
                 [CLIP_INX + CLIP_IN*CLIP_LIP, LID_TOP_Z],               // lip tip: overhang over the lid top
                 [CLIP_INX + CLIP_IN*CLIP_LIP, LID_TOP_Z + 0.4],         // lip front
                 [CLIP_INX - CLIP_IN*HOST_T/2, LID_TOP_Z + CLIP_RAMP_H]]);// lead-in ramp up into the wall
}
module lid_clip() {
    one_clip(CLIP_CY - CLIP_OFF);
    one_clip(CLIP_CY + CLIP_OFF);
}

// --- finger notch (CUT): a through-cut in the clip end wall, centred between the two clips.
//     Vertical sides + an ELLIPTICAL arched bottom (a rounded scoop, not a sharp box). Goes
//     THROUGH the wall so it reads as a visible scoop from the outside and a fingertip can
//     reach the lid edge to lift it. Deepest point is NOTCH_DEPTH below the rim.
module lid_finger_notch() {
    arch_cz = BODY_H - NOTCH_DEPTH + NOTCH_ARCH;          // z where the vertical sides meet the arc
    // vertical-sided upper part, open to the rim
    translate([CLIP_INX - EPS, CLIP_CY - NOTCH_W/2, arch_cz - EPS])
        cube([END_WALL + 2*EPS, NOTCH_W, (BODY_H + EPS) - (arch_cz - EPS)]);
    // elliptical arched bottom (y-semi = NOTCH_W/2, z-semi = NOTCH_ARCH), through the wall
    translate([CLIP_INX - EPS, CLIP_CY, arch_cz])
        scale([1, 1, NOTCH_ARCH/(NOTCH_W/2)])
        rotate([0, 90, 0])
        cylinder(h = END_WALL + 2*EPS, r = NOTCH_W/2, $fn = 48);
    // ALSO remove the support ledge across the notch span, so a fingertip can reach under the
    // lid edge here (the ledge/rail stays everywhere else to keep pinching the lid with the clips)
    lx0 = min(CLIP_INX, CLIP_INX + CLIP_IN*LEDGE_W) - EPS;
    lx1 = max(CLIP_INX, CLIP_INX + CLIP_IN*LEDGE_W) + EPS;
    translate([lx0, CLIP_CY - NOTCH_W/2, LID_Z_UNDER - LEDGE_W - EPS])
        cube([lx1 - lx0, NOTCH_W, LEDGE_W + 2*EPS]);
}

// --- restore the inner-top rim chamfer where the LOWERED dividers meet the +x (clip) end wall.
//     The box chamfer is interrupted at those junctions (the divider fills the inner side before
//     it is lowered), leaving a full-height bulge once lowered. The -x/hinge side is already
//     handled by the continuous journal chamfer; this does the same at the +x end.
module div_chamfer_fix() {
    cz = BODY_H - CHAMFER;            // 57, chamfer base
    xf = TOTAL_LEN - END_WALL;        // 202, +x clip-wall inner face
    for (yb = [DIV_KF, DIV_FS])
        translate([0, yb[0] - EPS, 0]) rotate([90,0,0]) translate([0,0,-((yb[1]-yb[0])+2*EPS)]) linear_extrude((yb[1]-yb[0])+2*EPS)
            polygon([[xf, cz], [xf - EPS, BODY_H + EPS], [xf + CHAMFER, BODY_H + EPS]]);  // bevel toward the wall (x>202)
}

// ============================================================================
// The six pieces.  piece = intersection(box, cell + own male keys) - own sockets
//   A halves are MALE on the A/B seam (keep the key); B halves are FEMALE (slot).
//   On a chamber seam the LEFT chamber is male (+Y), the right chamber is female.
// ============================================================================
// Base half-lap shingling (FEMALE-first, Option 1):
//   A/B seam  -> the B half owns the bottom shelf (grows -X), A has the negative.
//   chamber   -> the UPPER chamber (fork, spoon) owns the shelf (grows -Y); the
//                lower chamber (knife, fork) has the negative.
//   Assembly order: spoon, fork, knife; B before A (male lowered onto female).
// Center crossings (104,81)&(104,186): the CHAMBER shelf (fork_A / spoon_A) owns the
//   crossing square; the B-half A/B shelf (knife_B / fork_B) is CLIPPED short of the
//   chamber seam by LAP_LEN so two shelves never collide.
module knife_A() {                                       // placed LAST; receives everything
    difference() {
        union() {
            intersection() {
                box();
                union() {
                    cell(-1, AB_SEAM, KNIFE_Y0 - 1, KNIFE_Y1);
                    ab_key(YC_OUTL); ab_key(YC_DIVKF); ch_key(SEAM_KF, ENDC_A);
                    ab_cap(YC_OUTL); div_cap(YC_DIVKF); ch_cap(SEAM_KF, ENDC_A);  // hide tops (divider uses LOWERED hat)
                }
            }
            intersection() { lid_ledge(); cell(-1, AB_SEAM, KNIFE_Y0 - 1, KNIFE_Y1); }  // lid support ledge
        }
        lap_neg_X(KNIFE_Y0, KNIFE_Y1);            // receive knife_B's A/B shelf
        lap_neg_Y(SEAM_KF, 0, AB_SEAM);           // receive fork_A's chamber shelf
        hinge_groove(); divider_lower(); lid_finger_notch(); div_chamfer_fix();   // lid cuts (groove hits A pieces; divider/scallop where present)
    }
}

module knife_B() {
    difference() {
        union() {
            intersection() {
                box();
                union() {
                    cell(AB_SEAM, TOTAL_LEN + 1, KNIFE_Y0 - 1, KNIFE_Y1);
                    ch_key(SEAM_KF, ENDC_B);
                    ch_cap(SEAM_KF, ENDC_B);                // hide top (male, chamber)
                }
            }
            lap_shelf_X(KNIFE_Y0, KNIFE_Y1 - LAP_LEN);  // A/B shelf -> knife_A (CLIPPED at y=81 crossing)
            intersection() { lid_ledge(); cell(AB_SEAM, TOTAL_LEN + 1, KNIFE_Y0 - 1, KNIFE_Y1); }  // lid support ledge
        }
        ab_socket(YC_OUTL); ab_socket(YC_DIVKF);
        ab_cap_neg(YC_OUTL); div_cap_neg(YC_DIVKF);      // top recesses to receive knife_A's caps (divider = LOWERED hat)
        lap_neg_Y(SEAM_KF, AB_SEAM, TOTAL_LEN);         // receive fork_B's chamber shelf
        hinge_groove(); divider_lower(); lid_finger_notch(); div_chamfer_fix();   // lid cuts
    }
}

module fork_A() {
    difference() {
        union() {
            intersection() {
                box();
                union() {
                    cell(-1, AB_SEAM, FORK_Y0 + SEAM_EPS, FORK_Y1);  // -Y cut nudged off the divider face
                    ab_key(YC_DIVFS); ch_key(SEAM_FS, ENDC_A);
                    div_cap(YC_DIVFS); ch_cap(SEAM_FS, ENDC_A);       // hide tops (divider uses LOWERED hat)
                }
            }
            lap_shelf_Y(SEAM_KF, 0, AB_SEAM);           // chamber shelf -> knife_A (owns crossing)
            intersection() { lid_ledge(); cell(-1, AB_SEAM, FORK_Y0 + SEAM_EPS, FORK_Y1); }  // lid support ledge (none in fork-A)
        }
        lap_neg_X(FORK_Y0, FORK_Y1);                    // receive fork_B's A/B shelf
        ch_socket(SEAM_KF, ENDC_A);
        ch_cap_neg(SEAM_KF, ENDC_A);                    // top recess to receive knife_A's chamber cap (female)
        lap_neg_Y(SEAM_FS, 0, AB_SEAM, LAP_LEN_FS);     // receive spoon_A's (small) chamber shelf
        hinge_groove(); divider_lower(); lid_finger_notch(); div_chamfer_fix();   // lid cuts (groove = fork-A hinge segment; divider = DIV_FS)
    }
}

module fork_B() {
    union() {
        difference() {
            union() {
                intersection() {
                    box();
                    union() {
                        cell(AB_SEAM, TOTAL_LEN + 1, FORK_Y0 + SEAM_EPS, FORK_Y1);  // -Y cut nudged off the divider face
                        ch_key(SEAM_FS, ENDC_B);
                        ch_cap(SEAM_FS, ENDC_B);                // hide top (male, chamber)
                    }
                }
                lap_shelf_X(FORK_Y0, FORK_Y1 - LAP_LEN_FS); // A/B shelf -> fork_A (CLIPPED at y=186 crossing)
                lap_shelf_Y(SEAM_KF, AB_SEAM, TOTAL_LEN);   // chamber shelf -> knife_B
                intersection() { lid_ledge(); cell(AB_SEAM, TOTAL_LEN + 1, FORK_Y0 + SEAM_EPS, FORK_Y1); }  // lid ledge (clip-end run)
            }
            ab_socket(YC_DIVFS);
            div_cap_neg(YC_DIVFS);                           // top recess to receive fork_A's A/B cap (divider = LOWERED hat)
            ch_socket(SEAM_KF, ENDC_B);
            ch_cap_neg(SEAM_KF, ENDC_B);                    // top recess to receive knife_B's chamber cap (female)
            lap_neg_Y(SEAM_FS, AB_SEAM, TOTAL_LEN, LAP_LEN_FS); // receive spoon_B's (small) chamber shelf
            hinge_groove(); divider_lower(); lid_finger_notch(); div_chamfer_fix();     // lid cuts (scallop lands here)
        }
        intersection() { lid_clip(); cell(AB_SEAM, TOTAL_LEN + 1, FORK_Y0 + SEAM_EPS, FORK_Y1); }  // retaining clip, added AFTER the scallop cut
    }
}

module spoon_A() {
    difference() {
        union() {
            intersection() {
                box();
                union() {
                    cell(-1, AB_SEAM, SPOON_Y0 + SEAM_EPS, SPOON_Y1 + 1);  // -Y cut nudged off the divider face
                    ab_key(YC_OUTR);
                    ab_cap(YC_OUTR);                        // hide top (male)
                }
            }
            lap_shelf_Y(SEAM_FS, 0, AB_SEAM, LAP_LEN_FS); // chamber shelf -> fork_A (small; owns crossing)
            intersection() { lid_ledge(); cell(-1, AB_SEAM, SPOON_Y0 + SEAM_EPS, SPOON_Y1 + 1); }  // lid support ledge (OUTER_R run)
        }
        lap_neg_X(SPOON_Y0, SPOON_Y1);                  // receive spoon_B's A/B shelf
        ch_socket(SEAM_FS, ENDC_A);
        ch_cap_neg(SEAM_FS, ENDC_A);                    // top recess to receive fork_A's chamber cap (female)
        hinge_groove(); divider_lower(); lid_finger_notch(); div_chamfer_fix();   // lid cuts (groove = spoon-A hinge segment)
    }
}

module spoon_B() {                                      // placed FIRST; owns shelves
    difference() {
        union() {
            intersection() {
                box();
                union() {
                    cell(AB_SEAM, TOTAL_LEN + 1, SPOON_Y0 + SEAM_EPS, SPOON_Y1 + 1);  // -Y cut nudged off the divider face
                }
            }
            lap_shelf_X(SPOON_Y0, SPOON_Y1);            // A/B shelf -> spoon_A
            lap_shelf_Y(SEAM_FS, AB_SEAM, TOTAL_LEN, LAP_LEN_FS); // chamber shelf -> fork_B (small)
            intersection() { lid_ledge(); cell(AB_SEAM, TOTAL_LEN + 1, SPOON_Y0 + SEAM_EPS, SPOON_Y1 + 1); }  // lid ledge (OUTER_R + clip-end runs)
        }
        ab_socket(YC_OUTR);
        ab_cap_neg(YC_OUTR);                            // top recess to receive spoon_A's A/B cap (female)
        ch_socket(SEAM_FS, ENDC_B);
        ch_cap_neg(SEAM_FS, ENDC_B);                    // top recess to receive fork_B's chamber cap (female)
        hinge_groove(); divider_lower(); lid_finger_notch(); div_chamfer_fix();   // lid cuts
    }
}

// TRUE assembled view: the six real, separable pieces in their assembled positions
// (slower to render — many booleans — but this is what actually shows the seams, the
// lowered dividers, the hinge journal, the clip, the scallop, and all the joints).
// For a fast no-cuts preview of just the outer shell, temporarily use box(); instead.
module assembly() {
    knife_A(); knife_B(); fork_A(); fork_B(); spoon_A(); spoon_B();
}

// ============================================================================
// Render dispatch
// ============================================================================
if      (part == "knife_A")  knife_A();
else if (part == "knife_B")  knife_B();
else if (part == "fork_A")   fork_A();
else if (part == "fork_B")   fork_B();
else if (part == "spoon_A")  spoon_A();
else if (part == "spoon_B")  spoon_B();
else if (part == "assembly") assembly();
else echo(str("Unknown part: ", part));
